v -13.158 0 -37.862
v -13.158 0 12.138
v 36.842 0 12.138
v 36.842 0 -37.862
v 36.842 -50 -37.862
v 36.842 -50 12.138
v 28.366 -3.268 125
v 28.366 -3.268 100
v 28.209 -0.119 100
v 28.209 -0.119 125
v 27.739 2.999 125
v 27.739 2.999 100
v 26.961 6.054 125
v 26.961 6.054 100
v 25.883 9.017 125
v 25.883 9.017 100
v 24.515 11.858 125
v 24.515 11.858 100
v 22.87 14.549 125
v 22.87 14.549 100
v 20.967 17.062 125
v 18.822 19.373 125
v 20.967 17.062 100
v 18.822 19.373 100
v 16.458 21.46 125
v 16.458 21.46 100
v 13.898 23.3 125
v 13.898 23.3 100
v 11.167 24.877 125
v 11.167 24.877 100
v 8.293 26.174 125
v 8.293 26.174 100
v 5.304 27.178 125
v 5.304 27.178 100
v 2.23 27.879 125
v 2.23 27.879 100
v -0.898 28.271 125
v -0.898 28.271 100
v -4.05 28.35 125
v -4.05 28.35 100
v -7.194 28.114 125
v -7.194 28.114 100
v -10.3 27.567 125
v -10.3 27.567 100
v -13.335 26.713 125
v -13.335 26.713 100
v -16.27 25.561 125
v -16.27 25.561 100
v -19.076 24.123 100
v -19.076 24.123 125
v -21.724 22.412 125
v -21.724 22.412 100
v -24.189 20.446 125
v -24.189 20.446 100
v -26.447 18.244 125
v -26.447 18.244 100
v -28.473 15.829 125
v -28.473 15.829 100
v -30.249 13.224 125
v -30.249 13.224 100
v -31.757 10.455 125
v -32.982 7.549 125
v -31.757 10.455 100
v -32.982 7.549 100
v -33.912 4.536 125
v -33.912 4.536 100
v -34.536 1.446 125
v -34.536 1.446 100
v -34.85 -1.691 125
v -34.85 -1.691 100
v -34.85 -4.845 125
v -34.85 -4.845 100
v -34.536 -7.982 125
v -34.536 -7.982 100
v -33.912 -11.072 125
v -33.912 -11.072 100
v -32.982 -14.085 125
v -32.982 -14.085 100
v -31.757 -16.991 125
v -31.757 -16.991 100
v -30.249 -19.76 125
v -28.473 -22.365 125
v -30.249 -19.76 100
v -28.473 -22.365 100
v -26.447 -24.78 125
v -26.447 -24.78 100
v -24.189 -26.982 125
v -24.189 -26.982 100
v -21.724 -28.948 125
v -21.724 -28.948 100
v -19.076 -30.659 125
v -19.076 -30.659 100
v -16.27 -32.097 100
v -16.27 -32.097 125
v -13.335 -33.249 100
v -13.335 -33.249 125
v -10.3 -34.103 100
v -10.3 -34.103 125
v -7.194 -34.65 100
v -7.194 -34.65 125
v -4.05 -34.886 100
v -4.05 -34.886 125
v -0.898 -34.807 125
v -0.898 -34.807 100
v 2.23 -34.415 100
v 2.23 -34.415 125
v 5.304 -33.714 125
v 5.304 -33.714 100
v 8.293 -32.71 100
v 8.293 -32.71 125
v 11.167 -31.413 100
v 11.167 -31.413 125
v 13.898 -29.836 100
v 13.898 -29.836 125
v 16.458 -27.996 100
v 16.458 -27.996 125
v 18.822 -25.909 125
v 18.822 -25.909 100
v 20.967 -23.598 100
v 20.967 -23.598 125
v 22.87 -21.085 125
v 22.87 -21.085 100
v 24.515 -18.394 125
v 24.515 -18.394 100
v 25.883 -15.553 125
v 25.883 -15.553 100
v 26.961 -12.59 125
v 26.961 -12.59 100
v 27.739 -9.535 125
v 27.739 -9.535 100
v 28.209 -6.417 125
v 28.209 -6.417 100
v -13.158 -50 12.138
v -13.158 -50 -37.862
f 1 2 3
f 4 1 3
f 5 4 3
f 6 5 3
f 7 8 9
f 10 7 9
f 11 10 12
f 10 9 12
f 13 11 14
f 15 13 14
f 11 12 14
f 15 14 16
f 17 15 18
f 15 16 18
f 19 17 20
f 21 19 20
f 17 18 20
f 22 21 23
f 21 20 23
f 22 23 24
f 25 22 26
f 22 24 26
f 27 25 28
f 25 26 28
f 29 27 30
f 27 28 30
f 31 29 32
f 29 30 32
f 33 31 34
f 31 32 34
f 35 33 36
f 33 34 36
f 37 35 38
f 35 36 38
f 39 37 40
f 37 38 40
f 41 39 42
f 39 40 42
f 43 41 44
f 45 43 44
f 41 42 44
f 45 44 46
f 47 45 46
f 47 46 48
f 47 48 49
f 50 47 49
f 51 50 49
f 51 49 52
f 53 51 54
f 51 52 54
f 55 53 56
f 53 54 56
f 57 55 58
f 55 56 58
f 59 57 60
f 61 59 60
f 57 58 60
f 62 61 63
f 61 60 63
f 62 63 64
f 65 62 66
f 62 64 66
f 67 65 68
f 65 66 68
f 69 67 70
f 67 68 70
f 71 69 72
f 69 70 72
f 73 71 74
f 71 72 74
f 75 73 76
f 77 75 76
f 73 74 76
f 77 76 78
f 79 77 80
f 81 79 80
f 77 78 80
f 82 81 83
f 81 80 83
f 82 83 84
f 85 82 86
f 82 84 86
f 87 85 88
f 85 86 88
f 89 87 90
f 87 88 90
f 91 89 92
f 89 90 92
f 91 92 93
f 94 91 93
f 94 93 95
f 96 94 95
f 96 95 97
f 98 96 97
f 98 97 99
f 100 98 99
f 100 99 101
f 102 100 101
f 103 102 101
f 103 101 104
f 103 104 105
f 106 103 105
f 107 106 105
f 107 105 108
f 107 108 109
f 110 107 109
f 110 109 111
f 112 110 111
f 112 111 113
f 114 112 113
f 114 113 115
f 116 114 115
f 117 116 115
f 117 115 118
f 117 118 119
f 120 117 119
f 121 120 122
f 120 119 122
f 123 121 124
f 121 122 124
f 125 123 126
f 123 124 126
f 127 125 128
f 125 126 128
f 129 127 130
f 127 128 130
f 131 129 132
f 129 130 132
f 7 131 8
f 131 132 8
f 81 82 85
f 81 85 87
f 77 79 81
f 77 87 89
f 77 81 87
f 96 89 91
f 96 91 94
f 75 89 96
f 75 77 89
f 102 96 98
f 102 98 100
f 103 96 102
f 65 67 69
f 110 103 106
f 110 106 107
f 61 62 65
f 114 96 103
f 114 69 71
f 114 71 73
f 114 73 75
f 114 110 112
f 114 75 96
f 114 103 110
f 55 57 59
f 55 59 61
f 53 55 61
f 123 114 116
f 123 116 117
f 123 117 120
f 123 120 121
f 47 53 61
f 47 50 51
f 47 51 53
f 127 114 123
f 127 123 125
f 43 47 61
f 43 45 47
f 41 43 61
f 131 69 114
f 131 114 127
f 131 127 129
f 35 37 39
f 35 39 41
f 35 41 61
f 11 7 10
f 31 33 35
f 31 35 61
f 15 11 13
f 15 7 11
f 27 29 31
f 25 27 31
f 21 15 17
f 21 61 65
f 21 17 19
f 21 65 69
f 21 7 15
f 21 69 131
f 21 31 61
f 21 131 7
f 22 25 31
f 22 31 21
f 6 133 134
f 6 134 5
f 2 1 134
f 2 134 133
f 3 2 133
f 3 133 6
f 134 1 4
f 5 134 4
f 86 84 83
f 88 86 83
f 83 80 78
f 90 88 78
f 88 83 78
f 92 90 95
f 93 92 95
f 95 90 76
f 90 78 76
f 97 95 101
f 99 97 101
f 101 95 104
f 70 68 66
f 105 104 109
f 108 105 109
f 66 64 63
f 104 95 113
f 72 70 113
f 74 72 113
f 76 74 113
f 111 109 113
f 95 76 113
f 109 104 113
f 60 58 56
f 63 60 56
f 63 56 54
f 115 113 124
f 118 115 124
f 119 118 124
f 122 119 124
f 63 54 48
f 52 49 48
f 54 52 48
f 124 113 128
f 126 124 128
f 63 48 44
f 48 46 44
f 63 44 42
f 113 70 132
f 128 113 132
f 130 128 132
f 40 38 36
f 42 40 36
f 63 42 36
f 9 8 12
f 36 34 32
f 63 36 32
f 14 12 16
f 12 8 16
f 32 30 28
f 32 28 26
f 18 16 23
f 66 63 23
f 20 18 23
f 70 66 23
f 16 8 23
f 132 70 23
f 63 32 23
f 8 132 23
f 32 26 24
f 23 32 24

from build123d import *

# Parameters (mm, degrees)
F0_W     = 50
F0_H     = 50
F1_DEPTH = 50
F3_R     = 31.627873
F4_DEPTH = 25


with BuildPart() as f1:
    # F0 (on Front) → F1 (new body)
    with BuildSketch(Plane.XZ):
        with Locations((11.842105, -12.861841)):
            Rectangle(F0_W, F0_H)
    extrude(amount=F1_DEPTH)


with BuildPart() as f4:
    # F3 (on offset) → F4 (new body)
    with BuildSketch(Plane.XY.offset(100)):
        with Locations((-3.261681, -3.267993)):
            Circle(F3_R)
    extrude(amount=F4_DEPTH)


solid = Compound([f1.part, f4.part])
